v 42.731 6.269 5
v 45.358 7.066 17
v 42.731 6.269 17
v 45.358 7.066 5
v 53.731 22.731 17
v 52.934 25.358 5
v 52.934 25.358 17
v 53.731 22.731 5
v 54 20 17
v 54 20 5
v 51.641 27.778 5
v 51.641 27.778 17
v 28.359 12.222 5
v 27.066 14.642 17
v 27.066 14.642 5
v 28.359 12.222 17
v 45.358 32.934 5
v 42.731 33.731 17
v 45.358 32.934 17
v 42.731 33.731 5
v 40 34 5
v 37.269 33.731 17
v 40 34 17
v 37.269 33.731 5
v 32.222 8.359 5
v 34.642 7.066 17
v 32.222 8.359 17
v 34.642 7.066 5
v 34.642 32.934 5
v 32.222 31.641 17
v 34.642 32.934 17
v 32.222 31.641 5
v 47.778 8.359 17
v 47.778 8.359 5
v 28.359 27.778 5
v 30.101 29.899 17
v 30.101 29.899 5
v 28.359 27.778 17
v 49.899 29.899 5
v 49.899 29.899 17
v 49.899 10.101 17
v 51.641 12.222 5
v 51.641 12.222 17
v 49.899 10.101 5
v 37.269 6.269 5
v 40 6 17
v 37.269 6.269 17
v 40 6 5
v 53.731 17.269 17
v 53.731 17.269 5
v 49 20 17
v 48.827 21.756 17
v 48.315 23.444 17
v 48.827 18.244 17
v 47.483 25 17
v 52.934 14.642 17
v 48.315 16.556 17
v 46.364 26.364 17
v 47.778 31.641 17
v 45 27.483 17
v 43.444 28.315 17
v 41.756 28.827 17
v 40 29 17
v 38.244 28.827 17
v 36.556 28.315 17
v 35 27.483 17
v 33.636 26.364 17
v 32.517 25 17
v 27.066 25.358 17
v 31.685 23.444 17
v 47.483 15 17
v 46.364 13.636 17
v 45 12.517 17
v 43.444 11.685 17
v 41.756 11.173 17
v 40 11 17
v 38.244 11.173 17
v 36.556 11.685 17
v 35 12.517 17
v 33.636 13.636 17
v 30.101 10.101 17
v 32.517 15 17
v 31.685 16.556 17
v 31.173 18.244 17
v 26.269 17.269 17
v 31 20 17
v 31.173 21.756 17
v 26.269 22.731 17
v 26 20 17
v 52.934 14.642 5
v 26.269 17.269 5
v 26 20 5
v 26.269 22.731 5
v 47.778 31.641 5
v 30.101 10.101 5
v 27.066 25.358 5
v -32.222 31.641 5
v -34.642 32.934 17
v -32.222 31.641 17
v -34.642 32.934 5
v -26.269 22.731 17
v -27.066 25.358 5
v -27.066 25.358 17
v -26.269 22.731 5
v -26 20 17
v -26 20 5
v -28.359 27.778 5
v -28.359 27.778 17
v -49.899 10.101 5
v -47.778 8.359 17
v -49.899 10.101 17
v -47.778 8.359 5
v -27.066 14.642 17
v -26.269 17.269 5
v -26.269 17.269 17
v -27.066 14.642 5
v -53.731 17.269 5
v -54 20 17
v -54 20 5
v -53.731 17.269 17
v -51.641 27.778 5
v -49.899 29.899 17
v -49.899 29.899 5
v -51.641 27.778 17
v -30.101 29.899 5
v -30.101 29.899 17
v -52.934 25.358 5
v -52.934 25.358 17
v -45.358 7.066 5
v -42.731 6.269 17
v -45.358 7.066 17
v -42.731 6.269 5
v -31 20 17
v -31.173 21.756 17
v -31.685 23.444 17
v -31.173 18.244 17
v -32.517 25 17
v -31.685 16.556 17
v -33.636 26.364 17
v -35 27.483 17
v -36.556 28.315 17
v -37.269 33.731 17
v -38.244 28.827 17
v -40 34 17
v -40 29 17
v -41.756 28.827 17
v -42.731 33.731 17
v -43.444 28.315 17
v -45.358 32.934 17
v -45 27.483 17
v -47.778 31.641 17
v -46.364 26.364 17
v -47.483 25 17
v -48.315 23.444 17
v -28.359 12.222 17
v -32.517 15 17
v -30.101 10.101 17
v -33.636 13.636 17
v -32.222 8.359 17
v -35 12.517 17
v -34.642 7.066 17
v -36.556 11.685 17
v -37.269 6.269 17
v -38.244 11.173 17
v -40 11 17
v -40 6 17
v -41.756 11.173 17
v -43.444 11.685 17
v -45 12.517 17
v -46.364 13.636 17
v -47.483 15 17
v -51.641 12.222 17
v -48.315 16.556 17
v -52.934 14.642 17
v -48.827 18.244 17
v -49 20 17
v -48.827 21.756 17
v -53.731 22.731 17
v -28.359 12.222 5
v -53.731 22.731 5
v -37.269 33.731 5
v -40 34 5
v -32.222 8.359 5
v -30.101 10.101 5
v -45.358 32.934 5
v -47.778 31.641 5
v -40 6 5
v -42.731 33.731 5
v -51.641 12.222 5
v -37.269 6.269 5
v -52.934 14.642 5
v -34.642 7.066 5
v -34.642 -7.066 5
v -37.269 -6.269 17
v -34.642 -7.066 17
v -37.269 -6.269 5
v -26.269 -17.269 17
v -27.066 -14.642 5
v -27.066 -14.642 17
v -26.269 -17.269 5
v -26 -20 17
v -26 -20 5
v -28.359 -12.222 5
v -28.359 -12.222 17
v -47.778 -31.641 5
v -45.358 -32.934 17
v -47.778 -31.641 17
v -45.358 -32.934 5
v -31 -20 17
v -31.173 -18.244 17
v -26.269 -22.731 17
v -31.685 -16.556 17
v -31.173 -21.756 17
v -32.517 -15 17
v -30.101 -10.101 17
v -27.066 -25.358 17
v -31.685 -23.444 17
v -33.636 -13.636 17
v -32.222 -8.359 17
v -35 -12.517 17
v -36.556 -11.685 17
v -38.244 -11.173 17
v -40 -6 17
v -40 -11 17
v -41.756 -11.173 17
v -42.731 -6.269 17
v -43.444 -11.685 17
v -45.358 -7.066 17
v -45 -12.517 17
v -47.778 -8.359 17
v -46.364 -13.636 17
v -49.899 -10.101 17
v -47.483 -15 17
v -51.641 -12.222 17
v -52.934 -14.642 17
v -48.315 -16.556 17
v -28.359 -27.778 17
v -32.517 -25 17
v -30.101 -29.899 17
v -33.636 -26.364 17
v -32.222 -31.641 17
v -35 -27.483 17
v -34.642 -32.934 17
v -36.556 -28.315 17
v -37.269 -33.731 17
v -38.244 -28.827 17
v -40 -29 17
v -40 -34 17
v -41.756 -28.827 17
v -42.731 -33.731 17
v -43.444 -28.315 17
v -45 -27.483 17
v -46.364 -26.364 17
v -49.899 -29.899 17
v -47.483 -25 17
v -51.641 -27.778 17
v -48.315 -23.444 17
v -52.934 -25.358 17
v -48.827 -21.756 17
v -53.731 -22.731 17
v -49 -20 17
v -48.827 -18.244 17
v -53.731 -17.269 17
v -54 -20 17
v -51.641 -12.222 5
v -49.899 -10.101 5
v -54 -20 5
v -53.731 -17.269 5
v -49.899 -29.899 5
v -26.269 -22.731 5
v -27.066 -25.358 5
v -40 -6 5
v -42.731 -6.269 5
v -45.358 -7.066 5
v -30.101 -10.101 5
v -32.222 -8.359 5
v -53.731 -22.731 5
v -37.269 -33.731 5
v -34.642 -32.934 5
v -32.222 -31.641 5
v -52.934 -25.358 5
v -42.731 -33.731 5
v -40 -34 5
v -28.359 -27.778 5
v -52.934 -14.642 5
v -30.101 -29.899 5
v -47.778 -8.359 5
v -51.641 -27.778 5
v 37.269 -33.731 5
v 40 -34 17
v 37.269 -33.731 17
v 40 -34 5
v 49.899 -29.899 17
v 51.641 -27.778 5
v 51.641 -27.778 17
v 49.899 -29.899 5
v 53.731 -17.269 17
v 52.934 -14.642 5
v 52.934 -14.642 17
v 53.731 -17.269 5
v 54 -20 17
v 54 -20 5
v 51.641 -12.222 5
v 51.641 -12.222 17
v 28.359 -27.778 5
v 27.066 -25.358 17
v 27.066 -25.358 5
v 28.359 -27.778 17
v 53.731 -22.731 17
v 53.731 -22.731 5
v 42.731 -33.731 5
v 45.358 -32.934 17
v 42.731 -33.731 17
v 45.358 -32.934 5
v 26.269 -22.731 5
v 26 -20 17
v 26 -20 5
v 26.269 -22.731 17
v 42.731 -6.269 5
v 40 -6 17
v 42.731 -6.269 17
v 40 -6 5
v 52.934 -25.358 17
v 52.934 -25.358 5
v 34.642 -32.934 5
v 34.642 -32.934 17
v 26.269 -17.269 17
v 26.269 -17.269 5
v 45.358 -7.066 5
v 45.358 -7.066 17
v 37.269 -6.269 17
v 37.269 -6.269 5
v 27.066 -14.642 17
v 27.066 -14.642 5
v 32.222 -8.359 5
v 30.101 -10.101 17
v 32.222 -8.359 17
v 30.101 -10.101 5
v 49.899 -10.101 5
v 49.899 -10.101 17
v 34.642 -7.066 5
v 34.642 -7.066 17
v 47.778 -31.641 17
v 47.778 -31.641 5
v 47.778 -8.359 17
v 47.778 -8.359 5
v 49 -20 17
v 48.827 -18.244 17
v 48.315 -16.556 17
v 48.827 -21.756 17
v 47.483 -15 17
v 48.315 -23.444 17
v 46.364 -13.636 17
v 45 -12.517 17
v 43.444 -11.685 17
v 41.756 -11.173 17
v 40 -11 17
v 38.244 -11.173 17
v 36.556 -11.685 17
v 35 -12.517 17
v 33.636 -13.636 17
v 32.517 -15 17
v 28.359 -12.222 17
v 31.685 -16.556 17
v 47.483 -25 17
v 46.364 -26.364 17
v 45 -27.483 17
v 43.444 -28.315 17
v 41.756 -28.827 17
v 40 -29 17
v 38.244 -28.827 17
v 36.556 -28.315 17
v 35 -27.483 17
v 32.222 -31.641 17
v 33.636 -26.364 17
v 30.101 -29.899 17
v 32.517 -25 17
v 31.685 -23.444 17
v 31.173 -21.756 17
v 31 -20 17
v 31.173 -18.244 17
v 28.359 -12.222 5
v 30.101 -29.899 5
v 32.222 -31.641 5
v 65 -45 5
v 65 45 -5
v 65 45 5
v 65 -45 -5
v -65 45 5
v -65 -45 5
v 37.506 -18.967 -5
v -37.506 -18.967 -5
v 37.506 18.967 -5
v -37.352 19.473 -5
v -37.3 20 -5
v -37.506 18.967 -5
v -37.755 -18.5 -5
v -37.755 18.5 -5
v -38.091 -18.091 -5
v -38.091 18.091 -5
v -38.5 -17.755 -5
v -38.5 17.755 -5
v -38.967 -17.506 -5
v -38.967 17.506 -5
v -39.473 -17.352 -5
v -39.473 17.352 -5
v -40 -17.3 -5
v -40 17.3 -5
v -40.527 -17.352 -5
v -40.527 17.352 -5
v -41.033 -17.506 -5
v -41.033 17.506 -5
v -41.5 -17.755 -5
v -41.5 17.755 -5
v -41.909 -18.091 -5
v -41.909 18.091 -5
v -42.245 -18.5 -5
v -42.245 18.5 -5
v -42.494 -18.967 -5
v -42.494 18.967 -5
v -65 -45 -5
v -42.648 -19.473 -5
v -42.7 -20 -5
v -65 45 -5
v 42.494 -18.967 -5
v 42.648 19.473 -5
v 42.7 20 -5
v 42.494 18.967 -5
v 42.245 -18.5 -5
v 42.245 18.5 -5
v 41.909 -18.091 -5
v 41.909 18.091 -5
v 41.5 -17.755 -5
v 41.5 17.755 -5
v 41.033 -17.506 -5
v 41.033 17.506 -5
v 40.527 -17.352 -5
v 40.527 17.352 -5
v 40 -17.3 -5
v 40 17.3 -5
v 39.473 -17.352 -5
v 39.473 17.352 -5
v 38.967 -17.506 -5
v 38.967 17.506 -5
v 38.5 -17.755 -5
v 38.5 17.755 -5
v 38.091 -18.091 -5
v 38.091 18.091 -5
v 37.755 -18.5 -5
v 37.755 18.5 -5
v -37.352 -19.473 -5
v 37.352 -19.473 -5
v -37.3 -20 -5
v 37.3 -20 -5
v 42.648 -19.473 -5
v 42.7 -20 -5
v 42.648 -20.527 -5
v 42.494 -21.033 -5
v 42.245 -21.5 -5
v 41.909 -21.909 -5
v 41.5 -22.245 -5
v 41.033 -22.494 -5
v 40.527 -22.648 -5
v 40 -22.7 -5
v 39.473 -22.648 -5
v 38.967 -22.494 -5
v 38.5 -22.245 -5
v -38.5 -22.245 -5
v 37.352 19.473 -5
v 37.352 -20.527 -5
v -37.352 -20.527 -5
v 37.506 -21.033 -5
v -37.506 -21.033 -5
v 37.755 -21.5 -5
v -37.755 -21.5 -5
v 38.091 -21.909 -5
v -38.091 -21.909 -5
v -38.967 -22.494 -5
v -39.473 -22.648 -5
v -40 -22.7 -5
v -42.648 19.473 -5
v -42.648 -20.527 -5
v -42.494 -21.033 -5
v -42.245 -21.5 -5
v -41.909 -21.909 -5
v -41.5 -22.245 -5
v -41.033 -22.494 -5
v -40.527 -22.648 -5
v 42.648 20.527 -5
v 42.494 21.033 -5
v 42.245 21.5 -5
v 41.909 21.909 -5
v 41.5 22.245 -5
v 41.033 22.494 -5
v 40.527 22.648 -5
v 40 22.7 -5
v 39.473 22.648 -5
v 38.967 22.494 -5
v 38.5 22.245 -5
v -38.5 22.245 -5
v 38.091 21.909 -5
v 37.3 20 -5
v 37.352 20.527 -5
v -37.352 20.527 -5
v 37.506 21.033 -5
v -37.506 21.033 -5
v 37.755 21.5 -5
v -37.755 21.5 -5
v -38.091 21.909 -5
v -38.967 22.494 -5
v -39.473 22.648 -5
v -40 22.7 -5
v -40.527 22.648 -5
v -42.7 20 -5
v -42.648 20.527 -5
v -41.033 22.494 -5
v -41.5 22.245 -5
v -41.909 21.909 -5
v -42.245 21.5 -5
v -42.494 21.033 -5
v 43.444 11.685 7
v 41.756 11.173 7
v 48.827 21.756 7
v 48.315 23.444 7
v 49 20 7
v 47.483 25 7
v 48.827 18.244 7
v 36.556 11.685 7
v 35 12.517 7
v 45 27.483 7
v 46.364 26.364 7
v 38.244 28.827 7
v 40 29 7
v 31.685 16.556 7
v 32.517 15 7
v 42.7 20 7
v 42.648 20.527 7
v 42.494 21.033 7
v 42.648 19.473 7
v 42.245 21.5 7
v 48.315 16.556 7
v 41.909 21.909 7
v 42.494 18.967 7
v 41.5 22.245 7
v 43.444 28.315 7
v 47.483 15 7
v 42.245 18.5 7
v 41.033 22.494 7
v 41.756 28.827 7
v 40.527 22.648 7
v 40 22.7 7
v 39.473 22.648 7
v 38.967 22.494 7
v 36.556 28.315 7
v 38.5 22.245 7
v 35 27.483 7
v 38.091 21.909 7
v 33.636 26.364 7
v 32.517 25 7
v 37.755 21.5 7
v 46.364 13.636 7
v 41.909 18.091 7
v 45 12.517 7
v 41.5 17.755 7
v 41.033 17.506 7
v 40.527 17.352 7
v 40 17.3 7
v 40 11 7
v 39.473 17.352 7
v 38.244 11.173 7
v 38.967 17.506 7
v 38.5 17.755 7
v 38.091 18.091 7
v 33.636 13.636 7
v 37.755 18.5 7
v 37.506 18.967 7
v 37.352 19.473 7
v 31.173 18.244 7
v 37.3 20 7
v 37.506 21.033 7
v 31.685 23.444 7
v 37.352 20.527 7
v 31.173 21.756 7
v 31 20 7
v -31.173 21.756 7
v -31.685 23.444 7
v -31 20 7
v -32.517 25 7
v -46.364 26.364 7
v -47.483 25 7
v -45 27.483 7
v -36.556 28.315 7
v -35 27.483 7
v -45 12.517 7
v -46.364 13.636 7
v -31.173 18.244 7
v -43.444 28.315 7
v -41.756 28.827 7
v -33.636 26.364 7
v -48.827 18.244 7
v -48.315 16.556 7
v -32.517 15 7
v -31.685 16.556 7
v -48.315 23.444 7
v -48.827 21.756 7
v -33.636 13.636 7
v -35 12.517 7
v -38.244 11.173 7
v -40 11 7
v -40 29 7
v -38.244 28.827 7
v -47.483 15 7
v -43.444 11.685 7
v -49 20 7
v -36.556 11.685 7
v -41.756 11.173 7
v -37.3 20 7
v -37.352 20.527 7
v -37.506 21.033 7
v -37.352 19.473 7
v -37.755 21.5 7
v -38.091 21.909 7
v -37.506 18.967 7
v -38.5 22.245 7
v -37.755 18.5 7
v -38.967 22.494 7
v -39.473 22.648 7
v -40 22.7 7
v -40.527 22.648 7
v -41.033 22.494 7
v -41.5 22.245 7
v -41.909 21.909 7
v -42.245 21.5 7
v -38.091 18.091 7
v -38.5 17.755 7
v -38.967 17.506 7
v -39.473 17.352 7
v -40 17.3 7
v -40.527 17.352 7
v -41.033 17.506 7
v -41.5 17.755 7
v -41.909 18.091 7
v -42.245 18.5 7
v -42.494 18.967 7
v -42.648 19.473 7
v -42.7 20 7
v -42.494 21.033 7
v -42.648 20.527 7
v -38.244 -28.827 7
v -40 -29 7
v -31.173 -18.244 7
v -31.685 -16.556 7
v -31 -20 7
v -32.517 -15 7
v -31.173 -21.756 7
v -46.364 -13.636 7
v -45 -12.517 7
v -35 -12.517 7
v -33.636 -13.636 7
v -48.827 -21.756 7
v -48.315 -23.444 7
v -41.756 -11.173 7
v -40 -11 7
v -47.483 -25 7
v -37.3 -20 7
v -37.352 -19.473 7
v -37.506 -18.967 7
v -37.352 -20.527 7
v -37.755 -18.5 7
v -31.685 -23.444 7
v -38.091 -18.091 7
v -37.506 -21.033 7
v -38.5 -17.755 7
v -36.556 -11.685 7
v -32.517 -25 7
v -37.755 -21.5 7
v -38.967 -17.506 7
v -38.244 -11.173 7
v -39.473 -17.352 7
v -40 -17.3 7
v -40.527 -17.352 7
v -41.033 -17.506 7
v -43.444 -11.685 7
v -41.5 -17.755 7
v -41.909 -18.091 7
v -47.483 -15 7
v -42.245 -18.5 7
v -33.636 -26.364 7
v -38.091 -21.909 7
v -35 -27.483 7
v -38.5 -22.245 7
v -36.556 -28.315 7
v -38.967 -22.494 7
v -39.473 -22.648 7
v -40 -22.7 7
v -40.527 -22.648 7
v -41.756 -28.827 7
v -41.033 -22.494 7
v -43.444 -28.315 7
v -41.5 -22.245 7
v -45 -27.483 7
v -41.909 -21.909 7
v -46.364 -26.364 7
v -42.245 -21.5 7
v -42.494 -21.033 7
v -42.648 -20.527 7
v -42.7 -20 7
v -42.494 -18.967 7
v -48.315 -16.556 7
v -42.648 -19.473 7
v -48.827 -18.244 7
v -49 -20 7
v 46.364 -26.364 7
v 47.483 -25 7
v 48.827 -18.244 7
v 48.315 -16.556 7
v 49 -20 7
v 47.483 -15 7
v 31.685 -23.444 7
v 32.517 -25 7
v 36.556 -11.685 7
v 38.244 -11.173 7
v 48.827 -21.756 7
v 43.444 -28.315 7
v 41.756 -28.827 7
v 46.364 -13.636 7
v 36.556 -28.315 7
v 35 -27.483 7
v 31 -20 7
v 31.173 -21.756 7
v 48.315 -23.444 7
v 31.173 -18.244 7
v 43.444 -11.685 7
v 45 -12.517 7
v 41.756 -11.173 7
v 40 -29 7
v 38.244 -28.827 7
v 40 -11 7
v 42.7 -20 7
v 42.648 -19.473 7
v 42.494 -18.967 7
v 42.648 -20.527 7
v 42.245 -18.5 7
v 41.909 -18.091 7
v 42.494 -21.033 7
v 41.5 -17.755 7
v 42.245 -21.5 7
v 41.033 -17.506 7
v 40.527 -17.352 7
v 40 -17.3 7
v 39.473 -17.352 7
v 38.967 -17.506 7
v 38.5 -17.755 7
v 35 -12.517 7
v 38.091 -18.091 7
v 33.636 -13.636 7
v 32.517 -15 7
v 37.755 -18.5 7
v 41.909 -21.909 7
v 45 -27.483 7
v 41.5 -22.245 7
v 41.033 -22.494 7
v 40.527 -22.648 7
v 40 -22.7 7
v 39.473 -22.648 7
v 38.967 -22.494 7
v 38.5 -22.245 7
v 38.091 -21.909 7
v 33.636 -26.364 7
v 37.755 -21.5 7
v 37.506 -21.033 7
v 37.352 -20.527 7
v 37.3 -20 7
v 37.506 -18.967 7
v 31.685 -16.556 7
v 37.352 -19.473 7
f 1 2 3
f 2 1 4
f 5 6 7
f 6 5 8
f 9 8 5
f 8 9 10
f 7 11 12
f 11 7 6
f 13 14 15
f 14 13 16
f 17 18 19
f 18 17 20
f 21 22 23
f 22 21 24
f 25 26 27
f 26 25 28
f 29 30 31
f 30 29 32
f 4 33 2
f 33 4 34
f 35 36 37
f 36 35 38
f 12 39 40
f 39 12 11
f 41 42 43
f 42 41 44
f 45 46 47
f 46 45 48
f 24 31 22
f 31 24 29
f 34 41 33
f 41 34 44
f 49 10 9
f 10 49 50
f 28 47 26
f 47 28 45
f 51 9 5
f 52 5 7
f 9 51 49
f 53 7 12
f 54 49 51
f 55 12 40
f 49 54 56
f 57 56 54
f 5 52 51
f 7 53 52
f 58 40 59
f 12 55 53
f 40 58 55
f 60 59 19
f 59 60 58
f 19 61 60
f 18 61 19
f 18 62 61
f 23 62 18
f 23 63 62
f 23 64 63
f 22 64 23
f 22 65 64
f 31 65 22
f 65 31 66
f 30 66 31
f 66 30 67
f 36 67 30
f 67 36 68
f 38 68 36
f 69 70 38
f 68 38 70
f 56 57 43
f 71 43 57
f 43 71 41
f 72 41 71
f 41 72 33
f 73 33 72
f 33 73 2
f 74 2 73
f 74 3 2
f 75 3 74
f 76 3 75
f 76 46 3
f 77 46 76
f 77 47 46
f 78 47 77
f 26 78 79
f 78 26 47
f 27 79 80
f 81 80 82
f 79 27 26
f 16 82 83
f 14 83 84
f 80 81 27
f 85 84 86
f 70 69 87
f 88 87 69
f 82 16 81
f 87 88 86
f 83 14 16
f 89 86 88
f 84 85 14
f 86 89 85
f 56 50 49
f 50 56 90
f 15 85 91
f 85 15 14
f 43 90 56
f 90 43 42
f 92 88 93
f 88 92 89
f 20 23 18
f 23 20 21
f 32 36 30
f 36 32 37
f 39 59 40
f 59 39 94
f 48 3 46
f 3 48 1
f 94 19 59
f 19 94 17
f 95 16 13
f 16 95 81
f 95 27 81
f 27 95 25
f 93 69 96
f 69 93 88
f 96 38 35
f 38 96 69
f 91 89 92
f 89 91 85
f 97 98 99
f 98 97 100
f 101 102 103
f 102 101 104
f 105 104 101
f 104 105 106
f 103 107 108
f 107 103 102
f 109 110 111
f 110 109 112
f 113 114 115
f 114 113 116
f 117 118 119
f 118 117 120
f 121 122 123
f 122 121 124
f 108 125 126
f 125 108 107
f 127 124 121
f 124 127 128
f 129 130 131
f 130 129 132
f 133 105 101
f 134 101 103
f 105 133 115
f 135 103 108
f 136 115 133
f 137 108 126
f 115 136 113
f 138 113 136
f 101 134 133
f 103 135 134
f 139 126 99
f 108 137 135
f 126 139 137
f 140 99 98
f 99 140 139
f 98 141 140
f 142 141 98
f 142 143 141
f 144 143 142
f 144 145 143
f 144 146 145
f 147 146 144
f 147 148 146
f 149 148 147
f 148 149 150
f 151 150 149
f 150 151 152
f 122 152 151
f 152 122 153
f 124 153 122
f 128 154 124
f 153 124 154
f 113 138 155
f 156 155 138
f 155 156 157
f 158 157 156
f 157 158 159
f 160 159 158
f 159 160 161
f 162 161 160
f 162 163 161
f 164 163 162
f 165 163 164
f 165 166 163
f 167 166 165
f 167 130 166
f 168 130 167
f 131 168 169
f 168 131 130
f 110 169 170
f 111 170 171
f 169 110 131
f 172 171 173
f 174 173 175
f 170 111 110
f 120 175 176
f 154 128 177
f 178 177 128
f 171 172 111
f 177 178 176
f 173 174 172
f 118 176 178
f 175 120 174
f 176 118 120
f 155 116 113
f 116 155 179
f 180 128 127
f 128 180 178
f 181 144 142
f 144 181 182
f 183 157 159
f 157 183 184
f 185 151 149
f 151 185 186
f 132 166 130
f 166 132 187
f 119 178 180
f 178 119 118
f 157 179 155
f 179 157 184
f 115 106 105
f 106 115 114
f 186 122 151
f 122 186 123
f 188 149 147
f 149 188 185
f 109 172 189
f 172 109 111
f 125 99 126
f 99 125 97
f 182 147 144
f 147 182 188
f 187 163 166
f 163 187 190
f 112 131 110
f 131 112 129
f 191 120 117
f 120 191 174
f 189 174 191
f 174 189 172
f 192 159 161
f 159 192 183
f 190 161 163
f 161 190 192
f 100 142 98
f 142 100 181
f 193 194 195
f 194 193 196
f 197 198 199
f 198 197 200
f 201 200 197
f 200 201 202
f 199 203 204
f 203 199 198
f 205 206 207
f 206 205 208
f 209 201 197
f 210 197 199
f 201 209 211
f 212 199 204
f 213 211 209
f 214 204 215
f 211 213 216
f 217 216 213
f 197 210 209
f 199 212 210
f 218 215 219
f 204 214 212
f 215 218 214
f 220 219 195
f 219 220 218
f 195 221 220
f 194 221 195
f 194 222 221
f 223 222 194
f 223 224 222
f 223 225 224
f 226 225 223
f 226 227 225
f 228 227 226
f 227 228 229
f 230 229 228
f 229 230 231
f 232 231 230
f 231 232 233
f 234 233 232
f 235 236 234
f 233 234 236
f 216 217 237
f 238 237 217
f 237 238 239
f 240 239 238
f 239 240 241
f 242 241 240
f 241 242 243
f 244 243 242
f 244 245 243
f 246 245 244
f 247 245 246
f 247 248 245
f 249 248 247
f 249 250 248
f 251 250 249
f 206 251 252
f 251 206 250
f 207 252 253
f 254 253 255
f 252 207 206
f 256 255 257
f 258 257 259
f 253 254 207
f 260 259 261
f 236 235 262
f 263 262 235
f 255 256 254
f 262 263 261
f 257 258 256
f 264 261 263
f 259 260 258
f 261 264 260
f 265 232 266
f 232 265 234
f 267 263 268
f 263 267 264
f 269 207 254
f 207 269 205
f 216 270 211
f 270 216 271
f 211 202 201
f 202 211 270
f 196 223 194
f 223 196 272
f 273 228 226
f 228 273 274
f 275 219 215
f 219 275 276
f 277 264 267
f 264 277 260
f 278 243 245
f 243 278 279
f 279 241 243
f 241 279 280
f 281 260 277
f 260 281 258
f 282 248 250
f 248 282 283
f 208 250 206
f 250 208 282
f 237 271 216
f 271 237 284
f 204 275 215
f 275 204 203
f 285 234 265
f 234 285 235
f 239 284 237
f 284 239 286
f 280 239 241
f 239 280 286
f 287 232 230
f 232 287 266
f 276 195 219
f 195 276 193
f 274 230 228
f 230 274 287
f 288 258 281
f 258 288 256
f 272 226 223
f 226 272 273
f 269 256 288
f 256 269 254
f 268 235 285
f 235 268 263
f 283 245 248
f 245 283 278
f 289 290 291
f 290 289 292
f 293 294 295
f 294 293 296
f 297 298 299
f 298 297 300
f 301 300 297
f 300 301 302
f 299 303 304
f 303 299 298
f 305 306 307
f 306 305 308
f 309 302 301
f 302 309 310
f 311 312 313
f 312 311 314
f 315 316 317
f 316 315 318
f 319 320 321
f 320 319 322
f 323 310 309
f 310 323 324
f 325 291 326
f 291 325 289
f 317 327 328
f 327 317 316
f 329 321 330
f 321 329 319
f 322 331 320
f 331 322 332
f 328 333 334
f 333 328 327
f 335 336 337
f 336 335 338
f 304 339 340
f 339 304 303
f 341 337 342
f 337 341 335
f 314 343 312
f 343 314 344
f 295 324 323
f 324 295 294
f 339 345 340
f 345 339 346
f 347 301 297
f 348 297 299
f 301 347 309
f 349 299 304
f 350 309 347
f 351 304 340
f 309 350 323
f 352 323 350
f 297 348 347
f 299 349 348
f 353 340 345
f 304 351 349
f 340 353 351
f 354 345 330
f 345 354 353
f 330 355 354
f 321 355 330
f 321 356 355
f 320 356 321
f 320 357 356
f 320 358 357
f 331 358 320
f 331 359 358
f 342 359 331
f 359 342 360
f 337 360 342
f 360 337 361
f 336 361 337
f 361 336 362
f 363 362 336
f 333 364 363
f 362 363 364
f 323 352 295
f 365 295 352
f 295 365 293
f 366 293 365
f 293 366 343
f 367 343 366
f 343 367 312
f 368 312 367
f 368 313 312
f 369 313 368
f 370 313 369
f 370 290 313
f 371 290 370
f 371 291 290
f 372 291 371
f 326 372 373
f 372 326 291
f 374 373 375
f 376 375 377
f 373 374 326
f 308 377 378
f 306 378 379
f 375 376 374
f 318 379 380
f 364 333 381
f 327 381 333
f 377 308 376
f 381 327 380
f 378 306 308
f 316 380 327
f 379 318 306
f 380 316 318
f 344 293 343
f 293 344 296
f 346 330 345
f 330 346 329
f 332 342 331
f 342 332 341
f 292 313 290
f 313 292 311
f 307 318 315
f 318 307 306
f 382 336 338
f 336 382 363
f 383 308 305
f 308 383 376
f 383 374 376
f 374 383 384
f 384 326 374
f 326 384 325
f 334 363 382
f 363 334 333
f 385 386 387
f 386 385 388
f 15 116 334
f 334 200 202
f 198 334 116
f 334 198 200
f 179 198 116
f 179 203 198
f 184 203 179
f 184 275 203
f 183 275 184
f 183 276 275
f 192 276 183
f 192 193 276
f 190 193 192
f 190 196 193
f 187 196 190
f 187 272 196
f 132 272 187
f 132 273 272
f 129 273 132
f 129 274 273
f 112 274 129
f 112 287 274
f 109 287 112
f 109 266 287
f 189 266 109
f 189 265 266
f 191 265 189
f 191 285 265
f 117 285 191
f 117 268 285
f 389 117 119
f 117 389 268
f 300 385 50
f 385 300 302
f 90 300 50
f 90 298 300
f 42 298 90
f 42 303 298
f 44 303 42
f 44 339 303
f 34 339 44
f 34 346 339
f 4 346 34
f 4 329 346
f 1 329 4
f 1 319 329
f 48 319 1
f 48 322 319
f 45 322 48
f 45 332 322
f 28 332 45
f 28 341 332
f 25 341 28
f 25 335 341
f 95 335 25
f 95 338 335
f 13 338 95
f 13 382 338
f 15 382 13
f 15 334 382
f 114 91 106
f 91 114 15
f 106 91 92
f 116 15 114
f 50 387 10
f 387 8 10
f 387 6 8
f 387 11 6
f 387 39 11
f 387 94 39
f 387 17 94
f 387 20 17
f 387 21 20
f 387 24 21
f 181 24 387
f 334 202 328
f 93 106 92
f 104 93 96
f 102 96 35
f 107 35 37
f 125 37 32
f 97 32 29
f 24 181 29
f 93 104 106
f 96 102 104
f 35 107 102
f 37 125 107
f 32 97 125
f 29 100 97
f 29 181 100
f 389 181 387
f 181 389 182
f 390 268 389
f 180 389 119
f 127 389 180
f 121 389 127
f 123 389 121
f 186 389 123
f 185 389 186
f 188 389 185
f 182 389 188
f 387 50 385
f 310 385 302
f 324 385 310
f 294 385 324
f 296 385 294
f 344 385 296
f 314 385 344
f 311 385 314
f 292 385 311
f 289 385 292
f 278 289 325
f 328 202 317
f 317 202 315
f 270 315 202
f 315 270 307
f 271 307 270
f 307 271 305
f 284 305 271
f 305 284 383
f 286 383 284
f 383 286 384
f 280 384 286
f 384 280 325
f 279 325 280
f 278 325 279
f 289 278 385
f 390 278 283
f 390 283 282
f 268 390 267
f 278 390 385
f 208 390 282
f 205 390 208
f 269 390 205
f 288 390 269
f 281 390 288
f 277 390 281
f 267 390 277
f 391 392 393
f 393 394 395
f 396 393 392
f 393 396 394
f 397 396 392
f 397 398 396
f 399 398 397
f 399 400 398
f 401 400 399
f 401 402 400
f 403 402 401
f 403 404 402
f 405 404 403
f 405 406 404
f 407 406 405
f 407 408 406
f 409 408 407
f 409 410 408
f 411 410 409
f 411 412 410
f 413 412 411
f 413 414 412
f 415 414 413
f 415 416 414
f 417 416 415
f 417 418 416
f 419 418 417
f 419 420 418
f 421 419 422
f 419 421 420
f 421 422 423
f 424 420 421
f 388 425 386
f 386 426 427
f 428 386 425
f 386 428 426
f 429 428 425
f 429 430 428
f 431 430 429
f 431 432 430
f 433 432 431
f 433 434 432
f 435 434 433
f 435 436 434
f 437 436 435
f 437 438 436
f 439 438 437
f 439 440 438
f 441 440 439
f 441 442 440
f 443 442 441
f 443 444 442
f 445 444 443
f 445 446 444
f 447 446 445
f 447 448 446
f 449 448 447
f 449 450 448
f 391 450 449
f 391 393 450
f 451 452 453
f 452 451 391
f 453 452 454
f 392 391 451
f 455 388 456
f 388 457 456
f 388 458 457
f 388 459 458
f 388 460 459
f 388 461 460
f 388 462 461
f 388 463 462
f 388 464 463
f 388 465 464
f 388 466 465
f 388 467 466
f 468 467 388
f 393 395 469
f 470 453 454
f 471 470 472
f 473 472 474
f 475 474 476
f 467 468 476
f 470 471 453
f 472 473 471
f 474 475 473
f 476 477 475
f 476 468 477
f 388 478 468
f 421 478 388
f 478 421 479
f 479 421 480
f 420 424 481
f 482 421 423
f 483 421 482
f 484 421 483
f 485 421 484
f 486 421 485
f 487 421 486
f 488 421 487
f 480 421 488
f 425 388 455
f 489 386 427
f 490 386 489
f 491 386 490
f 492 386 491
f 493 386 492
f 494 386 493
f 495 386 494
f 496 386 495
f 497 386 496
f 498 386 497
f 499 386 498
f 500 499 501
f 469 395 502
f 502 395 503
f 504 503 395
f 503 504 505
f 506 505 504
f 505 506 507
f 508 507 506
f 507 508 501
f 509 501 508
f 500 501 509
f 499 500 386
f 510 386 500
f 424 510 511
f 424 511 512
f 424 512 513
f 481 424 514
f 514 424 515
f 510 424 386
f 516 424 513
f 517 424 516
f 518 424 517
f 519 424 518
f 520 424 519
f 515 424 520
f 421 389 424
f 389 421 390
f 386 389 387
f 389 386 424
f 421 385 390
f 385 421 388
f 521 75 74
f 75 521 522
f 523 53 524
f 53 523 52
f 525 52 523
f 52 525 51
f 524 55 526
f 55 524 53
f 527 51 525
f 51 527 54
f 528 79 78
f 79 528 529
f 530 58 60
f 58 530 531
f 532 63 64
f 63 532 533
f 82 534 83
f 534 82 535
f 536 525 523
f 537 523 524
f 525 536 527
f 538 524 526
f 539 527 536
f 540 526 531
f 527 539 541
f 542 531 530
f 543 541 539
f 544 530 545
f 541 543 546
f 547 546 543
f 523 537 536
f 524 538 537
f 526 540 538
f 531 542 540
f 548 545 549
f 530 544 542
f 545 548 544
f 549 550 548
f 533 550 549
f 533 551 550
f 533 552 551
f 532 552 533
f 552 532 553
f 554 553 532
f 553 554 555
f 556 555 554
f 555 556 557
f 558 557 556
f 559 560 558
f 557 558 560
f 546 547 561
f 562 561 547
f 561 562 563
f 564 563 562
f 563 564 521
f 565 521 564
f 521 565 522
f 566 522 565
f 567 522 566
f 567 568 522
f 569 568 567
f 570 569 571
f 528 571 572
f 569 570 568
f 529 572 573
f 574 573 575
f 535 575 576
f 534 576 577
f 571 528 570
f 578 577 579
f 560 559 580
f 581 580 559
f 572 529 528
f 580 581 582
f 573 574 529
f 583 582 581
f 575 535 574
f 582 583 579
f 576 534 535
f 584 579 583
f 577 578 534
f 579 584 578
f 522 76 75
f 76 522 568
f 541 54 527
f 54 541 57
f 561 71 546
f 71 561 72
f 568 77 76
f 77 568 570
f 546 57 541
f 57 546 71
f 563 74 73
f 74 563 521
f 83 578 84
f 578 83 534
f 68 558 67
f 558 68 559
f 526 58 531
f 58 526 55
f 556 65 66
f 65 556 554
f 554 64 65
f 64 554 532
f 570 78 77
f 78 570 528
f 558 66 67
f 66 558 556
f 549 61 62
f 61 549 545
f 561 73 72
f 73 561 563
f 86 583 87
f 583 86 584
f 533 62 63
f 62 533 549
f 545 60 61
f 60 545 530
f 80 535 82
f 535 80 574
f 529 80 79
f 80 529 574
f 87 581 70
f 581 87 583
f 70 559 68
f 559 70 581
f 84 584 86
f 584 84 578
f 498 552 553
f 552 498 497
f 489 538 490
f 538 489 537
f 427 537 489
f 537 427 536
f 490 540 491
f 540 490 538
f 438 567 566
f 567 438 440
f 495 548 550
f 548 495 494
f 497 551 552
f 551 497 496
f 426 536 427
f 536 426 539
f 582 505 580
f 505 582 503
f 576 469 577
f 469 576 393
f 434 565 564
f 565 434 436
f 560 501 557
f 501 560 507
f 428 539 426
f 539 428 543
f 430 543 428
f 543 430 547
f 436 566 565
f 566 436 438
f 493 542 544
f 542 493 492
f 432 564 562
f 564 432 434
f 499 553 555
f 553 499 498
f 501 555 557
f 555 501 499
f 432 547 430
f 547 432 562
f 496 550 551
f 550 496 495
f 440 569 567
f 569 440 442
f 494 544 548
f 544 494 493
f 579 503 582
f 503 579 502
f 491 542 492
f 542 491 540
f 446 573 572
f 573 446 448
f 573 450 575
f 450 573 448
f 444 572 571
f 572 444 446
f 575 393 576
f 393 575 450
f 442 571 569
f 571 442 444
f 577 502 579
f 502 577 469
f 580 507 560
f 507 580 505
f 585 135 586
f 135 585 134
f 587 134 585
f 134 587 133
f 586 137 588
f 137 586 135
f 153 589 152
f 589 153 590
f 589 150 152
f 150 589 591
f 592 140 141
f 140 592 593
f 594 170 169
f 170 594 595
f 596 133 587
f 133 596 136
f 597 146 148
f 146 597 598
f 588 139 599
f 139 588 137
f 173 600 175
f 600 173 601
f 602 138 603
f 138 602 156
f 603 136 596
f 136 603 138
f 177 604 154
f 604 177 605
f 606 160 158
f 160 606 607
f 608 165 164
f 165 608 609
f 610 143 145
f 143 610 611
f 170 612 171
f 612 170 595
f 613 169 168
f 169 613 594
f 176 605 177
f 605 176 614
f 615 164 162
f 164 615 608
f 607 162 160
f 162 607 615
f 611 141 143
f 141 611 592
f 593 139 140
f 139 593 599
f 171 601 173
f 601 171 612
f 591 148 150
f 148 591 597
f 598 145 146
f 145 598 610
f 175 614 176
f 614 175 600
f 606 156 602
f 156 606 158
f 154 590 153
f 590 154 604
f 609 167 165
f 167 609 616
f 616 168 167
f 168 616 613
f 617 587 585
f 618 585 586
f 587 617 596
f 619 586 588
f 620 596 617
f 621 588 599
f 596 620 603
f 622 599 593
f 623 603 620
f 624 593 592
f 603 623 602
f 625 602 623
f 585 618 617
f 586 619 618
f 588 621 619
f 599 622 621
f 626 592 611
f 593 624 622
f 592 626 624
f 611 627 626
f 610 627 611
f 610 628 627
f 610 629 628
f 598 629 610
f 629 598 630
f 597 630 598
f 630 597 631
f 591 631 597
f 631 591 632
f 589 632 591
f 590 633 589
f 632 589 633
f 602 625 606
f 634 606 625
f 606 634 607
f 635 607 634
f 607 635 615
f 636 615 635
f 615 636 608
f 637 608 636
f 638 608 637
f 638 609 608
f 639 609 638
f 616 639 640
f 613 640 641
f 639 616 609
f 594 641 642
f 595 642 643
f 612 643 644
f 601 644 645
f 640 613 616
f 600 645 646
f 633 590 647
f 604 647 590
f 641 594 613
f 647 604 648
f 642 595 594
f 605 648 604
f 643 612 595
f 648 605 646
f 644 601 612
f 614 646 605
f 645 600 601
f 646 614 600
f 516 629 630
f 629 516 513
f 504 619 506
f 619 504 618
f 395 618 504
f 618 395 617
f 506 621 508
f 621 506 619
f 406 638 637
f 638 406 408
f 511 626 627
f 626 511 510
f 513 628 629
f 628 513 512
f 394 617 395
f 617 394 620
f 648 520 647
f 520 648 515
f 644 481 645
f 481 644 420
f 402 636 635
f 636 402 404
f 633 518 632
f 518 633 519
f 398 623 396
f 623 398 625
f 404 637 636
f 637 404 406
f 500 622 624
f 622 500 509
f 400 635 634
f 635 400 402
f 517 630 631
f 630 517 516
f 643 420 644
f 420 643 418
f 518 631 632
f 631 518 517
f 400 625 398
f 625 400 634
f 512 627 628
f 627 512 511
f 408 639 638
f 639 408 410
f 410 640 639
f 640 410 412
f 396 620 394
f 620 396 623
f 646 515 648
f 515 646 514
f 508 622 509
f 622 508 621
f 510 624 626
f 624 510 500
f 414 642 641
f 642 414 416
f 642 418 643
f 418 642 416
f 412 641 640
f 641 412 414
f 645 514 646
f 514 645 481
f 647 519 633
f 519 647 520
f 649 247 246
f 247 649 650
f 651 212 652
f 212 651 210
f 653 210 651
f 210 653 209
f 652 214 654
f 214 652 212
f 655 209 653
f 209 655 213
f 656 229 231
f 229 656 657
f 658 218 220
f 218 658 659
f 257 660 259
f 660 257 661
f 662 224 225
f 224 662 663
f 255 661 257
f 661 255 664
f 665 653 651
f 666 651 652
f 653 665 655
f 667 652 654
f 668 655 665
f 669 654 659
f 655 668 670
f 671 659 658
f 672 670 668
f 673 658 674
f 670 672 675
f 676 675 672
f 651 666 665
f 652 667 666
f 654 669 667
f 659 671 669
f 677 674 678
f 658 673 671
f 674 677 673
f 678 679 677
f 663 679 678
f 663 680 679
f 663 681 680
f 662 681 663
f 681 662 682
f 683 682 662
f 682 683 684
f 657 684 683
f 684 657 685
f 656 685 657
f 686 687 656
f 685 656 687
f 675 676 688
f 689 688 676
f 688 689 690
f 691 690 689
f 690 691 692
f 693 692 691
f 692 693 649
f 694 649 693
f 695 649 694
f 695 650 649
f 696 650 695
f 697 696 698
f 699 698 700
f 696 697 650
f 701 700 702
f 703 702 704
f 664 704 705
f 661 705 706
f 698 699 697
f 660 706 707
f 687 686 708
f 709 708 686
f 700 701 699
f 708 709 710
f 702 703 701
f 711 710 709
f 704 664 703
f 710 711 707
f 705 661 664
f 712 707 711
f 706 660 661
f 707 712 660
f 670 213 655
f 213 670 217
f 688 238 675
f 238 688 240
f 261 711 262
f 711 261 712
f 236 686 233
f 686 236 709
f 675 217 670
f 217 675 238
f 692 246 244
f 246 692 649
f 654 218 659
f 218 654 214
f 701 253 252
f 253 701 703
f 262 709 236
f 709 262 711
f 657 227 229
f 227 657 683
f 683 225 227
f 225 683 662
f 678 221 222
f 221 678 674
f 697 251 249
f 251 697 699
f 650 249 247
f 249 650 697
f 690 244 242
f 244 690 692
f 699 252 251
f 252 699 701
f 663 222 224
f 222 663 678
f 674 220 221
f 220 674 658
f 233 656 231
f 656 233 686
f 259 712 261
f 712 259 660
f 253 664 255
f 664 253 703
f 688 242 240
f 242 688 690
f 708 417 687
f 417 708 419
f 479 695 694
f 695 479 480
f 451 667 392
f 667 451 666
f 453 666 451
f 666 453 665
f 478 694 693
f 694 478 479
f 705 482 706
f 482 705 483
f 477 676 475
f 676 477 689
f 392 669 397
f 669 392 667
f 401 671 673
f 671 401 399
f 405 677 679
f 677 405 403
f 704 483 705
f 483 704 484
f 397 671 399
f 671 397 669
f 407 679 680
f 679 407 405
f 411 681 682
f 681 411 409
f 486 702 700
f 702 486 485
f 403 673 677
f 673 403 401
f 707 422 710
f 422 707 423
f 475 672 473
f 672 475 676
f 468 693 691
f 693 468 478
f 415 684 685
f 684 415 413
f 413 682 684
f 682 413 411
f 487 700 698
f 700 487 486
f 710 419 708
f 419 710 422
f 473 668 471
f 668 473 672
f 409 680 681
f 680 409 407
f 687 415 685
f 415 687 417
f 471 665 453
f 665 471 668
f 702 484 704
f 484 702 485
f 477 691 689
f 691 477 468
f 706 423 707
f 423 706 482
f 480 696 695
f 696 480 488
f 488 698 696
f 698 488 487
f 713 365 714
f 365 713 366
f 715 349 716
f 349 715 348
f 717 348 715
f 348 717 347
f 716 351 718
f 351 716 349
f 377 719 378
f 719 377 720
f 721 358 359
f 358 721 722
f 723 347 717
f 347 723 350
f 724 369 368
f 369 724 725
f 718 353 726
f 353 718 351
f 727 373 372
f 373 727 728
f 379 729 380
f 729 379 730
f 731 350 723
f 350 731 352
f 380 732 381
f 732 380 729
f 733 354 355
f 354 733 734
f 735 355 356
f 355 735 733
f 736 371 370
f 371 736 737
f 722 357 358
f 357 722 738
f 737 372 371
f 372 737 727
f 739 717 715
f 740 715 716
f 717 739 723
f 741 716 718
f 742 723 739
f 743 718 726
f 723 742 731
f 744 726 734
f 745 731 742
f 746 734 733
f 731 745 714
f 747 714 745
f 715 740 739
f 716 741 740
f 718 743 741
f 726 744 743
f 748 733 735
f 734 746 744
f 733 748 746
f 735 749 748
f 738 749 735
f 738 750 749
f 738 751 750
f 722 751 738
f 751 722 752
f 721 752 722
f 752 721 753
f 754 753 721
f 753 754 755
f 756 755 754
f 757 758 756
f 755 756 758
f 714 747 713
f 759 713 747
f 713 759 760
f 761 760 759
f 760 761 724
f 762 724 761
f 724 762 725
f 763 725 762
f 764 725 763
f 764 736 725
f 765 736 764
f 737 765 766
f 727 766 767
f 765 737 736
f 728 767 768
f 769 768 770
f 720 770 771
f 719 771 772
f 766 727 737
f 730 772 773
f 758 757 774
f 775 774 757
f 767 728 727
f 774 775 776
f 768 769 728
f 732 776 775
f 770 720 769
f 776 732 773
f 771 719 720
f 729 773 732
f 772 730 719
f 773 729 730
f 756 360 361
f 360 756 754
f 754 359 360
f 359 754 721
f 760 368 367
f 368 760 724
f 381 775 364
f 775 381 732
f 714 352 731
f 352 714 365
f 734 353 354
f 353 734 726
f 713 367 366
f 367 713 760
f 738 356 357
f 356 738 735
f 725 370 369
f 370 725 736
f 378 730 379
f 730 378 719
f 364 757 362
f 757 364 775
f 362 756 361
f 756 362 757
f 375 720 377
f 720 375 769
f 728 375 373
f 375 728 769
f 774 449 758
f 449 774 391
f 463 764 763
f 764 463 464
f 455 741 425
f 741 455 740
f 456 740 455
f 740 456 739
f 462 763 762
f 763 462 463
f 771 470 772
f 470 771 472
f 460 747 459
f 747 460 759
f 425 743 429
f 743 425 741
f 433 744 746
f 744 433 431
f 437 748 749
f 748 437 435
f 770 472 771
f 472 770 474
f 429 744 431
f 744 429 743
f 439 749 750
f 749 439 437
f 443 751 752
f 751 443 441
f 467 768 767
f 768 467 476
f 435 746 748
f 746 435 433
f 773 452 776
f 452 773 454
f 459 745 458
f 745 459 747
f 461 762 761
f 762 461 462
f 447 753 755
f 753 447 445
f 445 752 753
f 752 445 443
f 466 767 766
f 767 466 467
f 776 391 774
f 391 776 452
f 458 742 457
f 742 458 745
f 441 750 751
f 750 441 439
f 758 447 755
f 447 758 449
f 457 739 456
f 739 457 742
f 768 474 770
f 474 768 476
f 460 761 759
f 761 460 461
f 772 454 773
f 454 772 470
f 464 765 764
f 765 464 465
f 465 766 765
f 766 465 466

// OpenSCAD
$fn = 32;

// ----------------------------------------------------------------------
// Socket pad plate
// bosses with counterbored sockets for the screws
// ----------------------------------------------------------------------

// --- parameters (mm) ---
base_t = 10;            // base plate thickness
boss_h = 12;            // boss height above the base plate
boss_d = 28;            // boss diameter
socket_d = 18;          // socket diameter
socket_depth = 10;      // socket depth from the boss face
bolt_d = 5.4;           // screw clearance hole through the socket floor
plate = [130, 90, 10];  // overall size (x, y, z)
edge = 25;              // boss centre offset from the plate edge
pads = 4;               // boss count, one per corner

// --- derived feature positions (mm) ---
height = base_t + boss_h;        // = 22   overall height of the part
corner_x = plate[0] / 2 - edge;  // = 40   boss centre X
corner_y = plate[1] / 2 - edge;  // = 20   boss centre Y
feature_centers = [
  [corner_x, corner_y],
  [-corner_x, corner_y],
  [-corner_x, -corner_y],
  [corner_x, -corner_y]
];   // boss centres: sockets, holes and the pads themselves are placed from here

// base plate, bosses on feature_centers, socket + through hole in each
difference() {
  union() {
    cube(plate, center = true);
    for (centre = feature_centers)
      translate([centre[0], centre[1], plate[2] / 2 - 1])
        cylinder(d = boss_d, h = boss_h + 1);
  }
  for (centre = feature_centers) {
    translate([centre[0], centre[1], plate[2] / 2 + boss_h - socket_depth])
      cylinder(d = socket_d, h = socket_depth + 1);
    translate([centre[0], centre[1], -height])
      cylinder(d = bolt_d, h = 2 * height + 2);  // through the socket floor
  }
}
